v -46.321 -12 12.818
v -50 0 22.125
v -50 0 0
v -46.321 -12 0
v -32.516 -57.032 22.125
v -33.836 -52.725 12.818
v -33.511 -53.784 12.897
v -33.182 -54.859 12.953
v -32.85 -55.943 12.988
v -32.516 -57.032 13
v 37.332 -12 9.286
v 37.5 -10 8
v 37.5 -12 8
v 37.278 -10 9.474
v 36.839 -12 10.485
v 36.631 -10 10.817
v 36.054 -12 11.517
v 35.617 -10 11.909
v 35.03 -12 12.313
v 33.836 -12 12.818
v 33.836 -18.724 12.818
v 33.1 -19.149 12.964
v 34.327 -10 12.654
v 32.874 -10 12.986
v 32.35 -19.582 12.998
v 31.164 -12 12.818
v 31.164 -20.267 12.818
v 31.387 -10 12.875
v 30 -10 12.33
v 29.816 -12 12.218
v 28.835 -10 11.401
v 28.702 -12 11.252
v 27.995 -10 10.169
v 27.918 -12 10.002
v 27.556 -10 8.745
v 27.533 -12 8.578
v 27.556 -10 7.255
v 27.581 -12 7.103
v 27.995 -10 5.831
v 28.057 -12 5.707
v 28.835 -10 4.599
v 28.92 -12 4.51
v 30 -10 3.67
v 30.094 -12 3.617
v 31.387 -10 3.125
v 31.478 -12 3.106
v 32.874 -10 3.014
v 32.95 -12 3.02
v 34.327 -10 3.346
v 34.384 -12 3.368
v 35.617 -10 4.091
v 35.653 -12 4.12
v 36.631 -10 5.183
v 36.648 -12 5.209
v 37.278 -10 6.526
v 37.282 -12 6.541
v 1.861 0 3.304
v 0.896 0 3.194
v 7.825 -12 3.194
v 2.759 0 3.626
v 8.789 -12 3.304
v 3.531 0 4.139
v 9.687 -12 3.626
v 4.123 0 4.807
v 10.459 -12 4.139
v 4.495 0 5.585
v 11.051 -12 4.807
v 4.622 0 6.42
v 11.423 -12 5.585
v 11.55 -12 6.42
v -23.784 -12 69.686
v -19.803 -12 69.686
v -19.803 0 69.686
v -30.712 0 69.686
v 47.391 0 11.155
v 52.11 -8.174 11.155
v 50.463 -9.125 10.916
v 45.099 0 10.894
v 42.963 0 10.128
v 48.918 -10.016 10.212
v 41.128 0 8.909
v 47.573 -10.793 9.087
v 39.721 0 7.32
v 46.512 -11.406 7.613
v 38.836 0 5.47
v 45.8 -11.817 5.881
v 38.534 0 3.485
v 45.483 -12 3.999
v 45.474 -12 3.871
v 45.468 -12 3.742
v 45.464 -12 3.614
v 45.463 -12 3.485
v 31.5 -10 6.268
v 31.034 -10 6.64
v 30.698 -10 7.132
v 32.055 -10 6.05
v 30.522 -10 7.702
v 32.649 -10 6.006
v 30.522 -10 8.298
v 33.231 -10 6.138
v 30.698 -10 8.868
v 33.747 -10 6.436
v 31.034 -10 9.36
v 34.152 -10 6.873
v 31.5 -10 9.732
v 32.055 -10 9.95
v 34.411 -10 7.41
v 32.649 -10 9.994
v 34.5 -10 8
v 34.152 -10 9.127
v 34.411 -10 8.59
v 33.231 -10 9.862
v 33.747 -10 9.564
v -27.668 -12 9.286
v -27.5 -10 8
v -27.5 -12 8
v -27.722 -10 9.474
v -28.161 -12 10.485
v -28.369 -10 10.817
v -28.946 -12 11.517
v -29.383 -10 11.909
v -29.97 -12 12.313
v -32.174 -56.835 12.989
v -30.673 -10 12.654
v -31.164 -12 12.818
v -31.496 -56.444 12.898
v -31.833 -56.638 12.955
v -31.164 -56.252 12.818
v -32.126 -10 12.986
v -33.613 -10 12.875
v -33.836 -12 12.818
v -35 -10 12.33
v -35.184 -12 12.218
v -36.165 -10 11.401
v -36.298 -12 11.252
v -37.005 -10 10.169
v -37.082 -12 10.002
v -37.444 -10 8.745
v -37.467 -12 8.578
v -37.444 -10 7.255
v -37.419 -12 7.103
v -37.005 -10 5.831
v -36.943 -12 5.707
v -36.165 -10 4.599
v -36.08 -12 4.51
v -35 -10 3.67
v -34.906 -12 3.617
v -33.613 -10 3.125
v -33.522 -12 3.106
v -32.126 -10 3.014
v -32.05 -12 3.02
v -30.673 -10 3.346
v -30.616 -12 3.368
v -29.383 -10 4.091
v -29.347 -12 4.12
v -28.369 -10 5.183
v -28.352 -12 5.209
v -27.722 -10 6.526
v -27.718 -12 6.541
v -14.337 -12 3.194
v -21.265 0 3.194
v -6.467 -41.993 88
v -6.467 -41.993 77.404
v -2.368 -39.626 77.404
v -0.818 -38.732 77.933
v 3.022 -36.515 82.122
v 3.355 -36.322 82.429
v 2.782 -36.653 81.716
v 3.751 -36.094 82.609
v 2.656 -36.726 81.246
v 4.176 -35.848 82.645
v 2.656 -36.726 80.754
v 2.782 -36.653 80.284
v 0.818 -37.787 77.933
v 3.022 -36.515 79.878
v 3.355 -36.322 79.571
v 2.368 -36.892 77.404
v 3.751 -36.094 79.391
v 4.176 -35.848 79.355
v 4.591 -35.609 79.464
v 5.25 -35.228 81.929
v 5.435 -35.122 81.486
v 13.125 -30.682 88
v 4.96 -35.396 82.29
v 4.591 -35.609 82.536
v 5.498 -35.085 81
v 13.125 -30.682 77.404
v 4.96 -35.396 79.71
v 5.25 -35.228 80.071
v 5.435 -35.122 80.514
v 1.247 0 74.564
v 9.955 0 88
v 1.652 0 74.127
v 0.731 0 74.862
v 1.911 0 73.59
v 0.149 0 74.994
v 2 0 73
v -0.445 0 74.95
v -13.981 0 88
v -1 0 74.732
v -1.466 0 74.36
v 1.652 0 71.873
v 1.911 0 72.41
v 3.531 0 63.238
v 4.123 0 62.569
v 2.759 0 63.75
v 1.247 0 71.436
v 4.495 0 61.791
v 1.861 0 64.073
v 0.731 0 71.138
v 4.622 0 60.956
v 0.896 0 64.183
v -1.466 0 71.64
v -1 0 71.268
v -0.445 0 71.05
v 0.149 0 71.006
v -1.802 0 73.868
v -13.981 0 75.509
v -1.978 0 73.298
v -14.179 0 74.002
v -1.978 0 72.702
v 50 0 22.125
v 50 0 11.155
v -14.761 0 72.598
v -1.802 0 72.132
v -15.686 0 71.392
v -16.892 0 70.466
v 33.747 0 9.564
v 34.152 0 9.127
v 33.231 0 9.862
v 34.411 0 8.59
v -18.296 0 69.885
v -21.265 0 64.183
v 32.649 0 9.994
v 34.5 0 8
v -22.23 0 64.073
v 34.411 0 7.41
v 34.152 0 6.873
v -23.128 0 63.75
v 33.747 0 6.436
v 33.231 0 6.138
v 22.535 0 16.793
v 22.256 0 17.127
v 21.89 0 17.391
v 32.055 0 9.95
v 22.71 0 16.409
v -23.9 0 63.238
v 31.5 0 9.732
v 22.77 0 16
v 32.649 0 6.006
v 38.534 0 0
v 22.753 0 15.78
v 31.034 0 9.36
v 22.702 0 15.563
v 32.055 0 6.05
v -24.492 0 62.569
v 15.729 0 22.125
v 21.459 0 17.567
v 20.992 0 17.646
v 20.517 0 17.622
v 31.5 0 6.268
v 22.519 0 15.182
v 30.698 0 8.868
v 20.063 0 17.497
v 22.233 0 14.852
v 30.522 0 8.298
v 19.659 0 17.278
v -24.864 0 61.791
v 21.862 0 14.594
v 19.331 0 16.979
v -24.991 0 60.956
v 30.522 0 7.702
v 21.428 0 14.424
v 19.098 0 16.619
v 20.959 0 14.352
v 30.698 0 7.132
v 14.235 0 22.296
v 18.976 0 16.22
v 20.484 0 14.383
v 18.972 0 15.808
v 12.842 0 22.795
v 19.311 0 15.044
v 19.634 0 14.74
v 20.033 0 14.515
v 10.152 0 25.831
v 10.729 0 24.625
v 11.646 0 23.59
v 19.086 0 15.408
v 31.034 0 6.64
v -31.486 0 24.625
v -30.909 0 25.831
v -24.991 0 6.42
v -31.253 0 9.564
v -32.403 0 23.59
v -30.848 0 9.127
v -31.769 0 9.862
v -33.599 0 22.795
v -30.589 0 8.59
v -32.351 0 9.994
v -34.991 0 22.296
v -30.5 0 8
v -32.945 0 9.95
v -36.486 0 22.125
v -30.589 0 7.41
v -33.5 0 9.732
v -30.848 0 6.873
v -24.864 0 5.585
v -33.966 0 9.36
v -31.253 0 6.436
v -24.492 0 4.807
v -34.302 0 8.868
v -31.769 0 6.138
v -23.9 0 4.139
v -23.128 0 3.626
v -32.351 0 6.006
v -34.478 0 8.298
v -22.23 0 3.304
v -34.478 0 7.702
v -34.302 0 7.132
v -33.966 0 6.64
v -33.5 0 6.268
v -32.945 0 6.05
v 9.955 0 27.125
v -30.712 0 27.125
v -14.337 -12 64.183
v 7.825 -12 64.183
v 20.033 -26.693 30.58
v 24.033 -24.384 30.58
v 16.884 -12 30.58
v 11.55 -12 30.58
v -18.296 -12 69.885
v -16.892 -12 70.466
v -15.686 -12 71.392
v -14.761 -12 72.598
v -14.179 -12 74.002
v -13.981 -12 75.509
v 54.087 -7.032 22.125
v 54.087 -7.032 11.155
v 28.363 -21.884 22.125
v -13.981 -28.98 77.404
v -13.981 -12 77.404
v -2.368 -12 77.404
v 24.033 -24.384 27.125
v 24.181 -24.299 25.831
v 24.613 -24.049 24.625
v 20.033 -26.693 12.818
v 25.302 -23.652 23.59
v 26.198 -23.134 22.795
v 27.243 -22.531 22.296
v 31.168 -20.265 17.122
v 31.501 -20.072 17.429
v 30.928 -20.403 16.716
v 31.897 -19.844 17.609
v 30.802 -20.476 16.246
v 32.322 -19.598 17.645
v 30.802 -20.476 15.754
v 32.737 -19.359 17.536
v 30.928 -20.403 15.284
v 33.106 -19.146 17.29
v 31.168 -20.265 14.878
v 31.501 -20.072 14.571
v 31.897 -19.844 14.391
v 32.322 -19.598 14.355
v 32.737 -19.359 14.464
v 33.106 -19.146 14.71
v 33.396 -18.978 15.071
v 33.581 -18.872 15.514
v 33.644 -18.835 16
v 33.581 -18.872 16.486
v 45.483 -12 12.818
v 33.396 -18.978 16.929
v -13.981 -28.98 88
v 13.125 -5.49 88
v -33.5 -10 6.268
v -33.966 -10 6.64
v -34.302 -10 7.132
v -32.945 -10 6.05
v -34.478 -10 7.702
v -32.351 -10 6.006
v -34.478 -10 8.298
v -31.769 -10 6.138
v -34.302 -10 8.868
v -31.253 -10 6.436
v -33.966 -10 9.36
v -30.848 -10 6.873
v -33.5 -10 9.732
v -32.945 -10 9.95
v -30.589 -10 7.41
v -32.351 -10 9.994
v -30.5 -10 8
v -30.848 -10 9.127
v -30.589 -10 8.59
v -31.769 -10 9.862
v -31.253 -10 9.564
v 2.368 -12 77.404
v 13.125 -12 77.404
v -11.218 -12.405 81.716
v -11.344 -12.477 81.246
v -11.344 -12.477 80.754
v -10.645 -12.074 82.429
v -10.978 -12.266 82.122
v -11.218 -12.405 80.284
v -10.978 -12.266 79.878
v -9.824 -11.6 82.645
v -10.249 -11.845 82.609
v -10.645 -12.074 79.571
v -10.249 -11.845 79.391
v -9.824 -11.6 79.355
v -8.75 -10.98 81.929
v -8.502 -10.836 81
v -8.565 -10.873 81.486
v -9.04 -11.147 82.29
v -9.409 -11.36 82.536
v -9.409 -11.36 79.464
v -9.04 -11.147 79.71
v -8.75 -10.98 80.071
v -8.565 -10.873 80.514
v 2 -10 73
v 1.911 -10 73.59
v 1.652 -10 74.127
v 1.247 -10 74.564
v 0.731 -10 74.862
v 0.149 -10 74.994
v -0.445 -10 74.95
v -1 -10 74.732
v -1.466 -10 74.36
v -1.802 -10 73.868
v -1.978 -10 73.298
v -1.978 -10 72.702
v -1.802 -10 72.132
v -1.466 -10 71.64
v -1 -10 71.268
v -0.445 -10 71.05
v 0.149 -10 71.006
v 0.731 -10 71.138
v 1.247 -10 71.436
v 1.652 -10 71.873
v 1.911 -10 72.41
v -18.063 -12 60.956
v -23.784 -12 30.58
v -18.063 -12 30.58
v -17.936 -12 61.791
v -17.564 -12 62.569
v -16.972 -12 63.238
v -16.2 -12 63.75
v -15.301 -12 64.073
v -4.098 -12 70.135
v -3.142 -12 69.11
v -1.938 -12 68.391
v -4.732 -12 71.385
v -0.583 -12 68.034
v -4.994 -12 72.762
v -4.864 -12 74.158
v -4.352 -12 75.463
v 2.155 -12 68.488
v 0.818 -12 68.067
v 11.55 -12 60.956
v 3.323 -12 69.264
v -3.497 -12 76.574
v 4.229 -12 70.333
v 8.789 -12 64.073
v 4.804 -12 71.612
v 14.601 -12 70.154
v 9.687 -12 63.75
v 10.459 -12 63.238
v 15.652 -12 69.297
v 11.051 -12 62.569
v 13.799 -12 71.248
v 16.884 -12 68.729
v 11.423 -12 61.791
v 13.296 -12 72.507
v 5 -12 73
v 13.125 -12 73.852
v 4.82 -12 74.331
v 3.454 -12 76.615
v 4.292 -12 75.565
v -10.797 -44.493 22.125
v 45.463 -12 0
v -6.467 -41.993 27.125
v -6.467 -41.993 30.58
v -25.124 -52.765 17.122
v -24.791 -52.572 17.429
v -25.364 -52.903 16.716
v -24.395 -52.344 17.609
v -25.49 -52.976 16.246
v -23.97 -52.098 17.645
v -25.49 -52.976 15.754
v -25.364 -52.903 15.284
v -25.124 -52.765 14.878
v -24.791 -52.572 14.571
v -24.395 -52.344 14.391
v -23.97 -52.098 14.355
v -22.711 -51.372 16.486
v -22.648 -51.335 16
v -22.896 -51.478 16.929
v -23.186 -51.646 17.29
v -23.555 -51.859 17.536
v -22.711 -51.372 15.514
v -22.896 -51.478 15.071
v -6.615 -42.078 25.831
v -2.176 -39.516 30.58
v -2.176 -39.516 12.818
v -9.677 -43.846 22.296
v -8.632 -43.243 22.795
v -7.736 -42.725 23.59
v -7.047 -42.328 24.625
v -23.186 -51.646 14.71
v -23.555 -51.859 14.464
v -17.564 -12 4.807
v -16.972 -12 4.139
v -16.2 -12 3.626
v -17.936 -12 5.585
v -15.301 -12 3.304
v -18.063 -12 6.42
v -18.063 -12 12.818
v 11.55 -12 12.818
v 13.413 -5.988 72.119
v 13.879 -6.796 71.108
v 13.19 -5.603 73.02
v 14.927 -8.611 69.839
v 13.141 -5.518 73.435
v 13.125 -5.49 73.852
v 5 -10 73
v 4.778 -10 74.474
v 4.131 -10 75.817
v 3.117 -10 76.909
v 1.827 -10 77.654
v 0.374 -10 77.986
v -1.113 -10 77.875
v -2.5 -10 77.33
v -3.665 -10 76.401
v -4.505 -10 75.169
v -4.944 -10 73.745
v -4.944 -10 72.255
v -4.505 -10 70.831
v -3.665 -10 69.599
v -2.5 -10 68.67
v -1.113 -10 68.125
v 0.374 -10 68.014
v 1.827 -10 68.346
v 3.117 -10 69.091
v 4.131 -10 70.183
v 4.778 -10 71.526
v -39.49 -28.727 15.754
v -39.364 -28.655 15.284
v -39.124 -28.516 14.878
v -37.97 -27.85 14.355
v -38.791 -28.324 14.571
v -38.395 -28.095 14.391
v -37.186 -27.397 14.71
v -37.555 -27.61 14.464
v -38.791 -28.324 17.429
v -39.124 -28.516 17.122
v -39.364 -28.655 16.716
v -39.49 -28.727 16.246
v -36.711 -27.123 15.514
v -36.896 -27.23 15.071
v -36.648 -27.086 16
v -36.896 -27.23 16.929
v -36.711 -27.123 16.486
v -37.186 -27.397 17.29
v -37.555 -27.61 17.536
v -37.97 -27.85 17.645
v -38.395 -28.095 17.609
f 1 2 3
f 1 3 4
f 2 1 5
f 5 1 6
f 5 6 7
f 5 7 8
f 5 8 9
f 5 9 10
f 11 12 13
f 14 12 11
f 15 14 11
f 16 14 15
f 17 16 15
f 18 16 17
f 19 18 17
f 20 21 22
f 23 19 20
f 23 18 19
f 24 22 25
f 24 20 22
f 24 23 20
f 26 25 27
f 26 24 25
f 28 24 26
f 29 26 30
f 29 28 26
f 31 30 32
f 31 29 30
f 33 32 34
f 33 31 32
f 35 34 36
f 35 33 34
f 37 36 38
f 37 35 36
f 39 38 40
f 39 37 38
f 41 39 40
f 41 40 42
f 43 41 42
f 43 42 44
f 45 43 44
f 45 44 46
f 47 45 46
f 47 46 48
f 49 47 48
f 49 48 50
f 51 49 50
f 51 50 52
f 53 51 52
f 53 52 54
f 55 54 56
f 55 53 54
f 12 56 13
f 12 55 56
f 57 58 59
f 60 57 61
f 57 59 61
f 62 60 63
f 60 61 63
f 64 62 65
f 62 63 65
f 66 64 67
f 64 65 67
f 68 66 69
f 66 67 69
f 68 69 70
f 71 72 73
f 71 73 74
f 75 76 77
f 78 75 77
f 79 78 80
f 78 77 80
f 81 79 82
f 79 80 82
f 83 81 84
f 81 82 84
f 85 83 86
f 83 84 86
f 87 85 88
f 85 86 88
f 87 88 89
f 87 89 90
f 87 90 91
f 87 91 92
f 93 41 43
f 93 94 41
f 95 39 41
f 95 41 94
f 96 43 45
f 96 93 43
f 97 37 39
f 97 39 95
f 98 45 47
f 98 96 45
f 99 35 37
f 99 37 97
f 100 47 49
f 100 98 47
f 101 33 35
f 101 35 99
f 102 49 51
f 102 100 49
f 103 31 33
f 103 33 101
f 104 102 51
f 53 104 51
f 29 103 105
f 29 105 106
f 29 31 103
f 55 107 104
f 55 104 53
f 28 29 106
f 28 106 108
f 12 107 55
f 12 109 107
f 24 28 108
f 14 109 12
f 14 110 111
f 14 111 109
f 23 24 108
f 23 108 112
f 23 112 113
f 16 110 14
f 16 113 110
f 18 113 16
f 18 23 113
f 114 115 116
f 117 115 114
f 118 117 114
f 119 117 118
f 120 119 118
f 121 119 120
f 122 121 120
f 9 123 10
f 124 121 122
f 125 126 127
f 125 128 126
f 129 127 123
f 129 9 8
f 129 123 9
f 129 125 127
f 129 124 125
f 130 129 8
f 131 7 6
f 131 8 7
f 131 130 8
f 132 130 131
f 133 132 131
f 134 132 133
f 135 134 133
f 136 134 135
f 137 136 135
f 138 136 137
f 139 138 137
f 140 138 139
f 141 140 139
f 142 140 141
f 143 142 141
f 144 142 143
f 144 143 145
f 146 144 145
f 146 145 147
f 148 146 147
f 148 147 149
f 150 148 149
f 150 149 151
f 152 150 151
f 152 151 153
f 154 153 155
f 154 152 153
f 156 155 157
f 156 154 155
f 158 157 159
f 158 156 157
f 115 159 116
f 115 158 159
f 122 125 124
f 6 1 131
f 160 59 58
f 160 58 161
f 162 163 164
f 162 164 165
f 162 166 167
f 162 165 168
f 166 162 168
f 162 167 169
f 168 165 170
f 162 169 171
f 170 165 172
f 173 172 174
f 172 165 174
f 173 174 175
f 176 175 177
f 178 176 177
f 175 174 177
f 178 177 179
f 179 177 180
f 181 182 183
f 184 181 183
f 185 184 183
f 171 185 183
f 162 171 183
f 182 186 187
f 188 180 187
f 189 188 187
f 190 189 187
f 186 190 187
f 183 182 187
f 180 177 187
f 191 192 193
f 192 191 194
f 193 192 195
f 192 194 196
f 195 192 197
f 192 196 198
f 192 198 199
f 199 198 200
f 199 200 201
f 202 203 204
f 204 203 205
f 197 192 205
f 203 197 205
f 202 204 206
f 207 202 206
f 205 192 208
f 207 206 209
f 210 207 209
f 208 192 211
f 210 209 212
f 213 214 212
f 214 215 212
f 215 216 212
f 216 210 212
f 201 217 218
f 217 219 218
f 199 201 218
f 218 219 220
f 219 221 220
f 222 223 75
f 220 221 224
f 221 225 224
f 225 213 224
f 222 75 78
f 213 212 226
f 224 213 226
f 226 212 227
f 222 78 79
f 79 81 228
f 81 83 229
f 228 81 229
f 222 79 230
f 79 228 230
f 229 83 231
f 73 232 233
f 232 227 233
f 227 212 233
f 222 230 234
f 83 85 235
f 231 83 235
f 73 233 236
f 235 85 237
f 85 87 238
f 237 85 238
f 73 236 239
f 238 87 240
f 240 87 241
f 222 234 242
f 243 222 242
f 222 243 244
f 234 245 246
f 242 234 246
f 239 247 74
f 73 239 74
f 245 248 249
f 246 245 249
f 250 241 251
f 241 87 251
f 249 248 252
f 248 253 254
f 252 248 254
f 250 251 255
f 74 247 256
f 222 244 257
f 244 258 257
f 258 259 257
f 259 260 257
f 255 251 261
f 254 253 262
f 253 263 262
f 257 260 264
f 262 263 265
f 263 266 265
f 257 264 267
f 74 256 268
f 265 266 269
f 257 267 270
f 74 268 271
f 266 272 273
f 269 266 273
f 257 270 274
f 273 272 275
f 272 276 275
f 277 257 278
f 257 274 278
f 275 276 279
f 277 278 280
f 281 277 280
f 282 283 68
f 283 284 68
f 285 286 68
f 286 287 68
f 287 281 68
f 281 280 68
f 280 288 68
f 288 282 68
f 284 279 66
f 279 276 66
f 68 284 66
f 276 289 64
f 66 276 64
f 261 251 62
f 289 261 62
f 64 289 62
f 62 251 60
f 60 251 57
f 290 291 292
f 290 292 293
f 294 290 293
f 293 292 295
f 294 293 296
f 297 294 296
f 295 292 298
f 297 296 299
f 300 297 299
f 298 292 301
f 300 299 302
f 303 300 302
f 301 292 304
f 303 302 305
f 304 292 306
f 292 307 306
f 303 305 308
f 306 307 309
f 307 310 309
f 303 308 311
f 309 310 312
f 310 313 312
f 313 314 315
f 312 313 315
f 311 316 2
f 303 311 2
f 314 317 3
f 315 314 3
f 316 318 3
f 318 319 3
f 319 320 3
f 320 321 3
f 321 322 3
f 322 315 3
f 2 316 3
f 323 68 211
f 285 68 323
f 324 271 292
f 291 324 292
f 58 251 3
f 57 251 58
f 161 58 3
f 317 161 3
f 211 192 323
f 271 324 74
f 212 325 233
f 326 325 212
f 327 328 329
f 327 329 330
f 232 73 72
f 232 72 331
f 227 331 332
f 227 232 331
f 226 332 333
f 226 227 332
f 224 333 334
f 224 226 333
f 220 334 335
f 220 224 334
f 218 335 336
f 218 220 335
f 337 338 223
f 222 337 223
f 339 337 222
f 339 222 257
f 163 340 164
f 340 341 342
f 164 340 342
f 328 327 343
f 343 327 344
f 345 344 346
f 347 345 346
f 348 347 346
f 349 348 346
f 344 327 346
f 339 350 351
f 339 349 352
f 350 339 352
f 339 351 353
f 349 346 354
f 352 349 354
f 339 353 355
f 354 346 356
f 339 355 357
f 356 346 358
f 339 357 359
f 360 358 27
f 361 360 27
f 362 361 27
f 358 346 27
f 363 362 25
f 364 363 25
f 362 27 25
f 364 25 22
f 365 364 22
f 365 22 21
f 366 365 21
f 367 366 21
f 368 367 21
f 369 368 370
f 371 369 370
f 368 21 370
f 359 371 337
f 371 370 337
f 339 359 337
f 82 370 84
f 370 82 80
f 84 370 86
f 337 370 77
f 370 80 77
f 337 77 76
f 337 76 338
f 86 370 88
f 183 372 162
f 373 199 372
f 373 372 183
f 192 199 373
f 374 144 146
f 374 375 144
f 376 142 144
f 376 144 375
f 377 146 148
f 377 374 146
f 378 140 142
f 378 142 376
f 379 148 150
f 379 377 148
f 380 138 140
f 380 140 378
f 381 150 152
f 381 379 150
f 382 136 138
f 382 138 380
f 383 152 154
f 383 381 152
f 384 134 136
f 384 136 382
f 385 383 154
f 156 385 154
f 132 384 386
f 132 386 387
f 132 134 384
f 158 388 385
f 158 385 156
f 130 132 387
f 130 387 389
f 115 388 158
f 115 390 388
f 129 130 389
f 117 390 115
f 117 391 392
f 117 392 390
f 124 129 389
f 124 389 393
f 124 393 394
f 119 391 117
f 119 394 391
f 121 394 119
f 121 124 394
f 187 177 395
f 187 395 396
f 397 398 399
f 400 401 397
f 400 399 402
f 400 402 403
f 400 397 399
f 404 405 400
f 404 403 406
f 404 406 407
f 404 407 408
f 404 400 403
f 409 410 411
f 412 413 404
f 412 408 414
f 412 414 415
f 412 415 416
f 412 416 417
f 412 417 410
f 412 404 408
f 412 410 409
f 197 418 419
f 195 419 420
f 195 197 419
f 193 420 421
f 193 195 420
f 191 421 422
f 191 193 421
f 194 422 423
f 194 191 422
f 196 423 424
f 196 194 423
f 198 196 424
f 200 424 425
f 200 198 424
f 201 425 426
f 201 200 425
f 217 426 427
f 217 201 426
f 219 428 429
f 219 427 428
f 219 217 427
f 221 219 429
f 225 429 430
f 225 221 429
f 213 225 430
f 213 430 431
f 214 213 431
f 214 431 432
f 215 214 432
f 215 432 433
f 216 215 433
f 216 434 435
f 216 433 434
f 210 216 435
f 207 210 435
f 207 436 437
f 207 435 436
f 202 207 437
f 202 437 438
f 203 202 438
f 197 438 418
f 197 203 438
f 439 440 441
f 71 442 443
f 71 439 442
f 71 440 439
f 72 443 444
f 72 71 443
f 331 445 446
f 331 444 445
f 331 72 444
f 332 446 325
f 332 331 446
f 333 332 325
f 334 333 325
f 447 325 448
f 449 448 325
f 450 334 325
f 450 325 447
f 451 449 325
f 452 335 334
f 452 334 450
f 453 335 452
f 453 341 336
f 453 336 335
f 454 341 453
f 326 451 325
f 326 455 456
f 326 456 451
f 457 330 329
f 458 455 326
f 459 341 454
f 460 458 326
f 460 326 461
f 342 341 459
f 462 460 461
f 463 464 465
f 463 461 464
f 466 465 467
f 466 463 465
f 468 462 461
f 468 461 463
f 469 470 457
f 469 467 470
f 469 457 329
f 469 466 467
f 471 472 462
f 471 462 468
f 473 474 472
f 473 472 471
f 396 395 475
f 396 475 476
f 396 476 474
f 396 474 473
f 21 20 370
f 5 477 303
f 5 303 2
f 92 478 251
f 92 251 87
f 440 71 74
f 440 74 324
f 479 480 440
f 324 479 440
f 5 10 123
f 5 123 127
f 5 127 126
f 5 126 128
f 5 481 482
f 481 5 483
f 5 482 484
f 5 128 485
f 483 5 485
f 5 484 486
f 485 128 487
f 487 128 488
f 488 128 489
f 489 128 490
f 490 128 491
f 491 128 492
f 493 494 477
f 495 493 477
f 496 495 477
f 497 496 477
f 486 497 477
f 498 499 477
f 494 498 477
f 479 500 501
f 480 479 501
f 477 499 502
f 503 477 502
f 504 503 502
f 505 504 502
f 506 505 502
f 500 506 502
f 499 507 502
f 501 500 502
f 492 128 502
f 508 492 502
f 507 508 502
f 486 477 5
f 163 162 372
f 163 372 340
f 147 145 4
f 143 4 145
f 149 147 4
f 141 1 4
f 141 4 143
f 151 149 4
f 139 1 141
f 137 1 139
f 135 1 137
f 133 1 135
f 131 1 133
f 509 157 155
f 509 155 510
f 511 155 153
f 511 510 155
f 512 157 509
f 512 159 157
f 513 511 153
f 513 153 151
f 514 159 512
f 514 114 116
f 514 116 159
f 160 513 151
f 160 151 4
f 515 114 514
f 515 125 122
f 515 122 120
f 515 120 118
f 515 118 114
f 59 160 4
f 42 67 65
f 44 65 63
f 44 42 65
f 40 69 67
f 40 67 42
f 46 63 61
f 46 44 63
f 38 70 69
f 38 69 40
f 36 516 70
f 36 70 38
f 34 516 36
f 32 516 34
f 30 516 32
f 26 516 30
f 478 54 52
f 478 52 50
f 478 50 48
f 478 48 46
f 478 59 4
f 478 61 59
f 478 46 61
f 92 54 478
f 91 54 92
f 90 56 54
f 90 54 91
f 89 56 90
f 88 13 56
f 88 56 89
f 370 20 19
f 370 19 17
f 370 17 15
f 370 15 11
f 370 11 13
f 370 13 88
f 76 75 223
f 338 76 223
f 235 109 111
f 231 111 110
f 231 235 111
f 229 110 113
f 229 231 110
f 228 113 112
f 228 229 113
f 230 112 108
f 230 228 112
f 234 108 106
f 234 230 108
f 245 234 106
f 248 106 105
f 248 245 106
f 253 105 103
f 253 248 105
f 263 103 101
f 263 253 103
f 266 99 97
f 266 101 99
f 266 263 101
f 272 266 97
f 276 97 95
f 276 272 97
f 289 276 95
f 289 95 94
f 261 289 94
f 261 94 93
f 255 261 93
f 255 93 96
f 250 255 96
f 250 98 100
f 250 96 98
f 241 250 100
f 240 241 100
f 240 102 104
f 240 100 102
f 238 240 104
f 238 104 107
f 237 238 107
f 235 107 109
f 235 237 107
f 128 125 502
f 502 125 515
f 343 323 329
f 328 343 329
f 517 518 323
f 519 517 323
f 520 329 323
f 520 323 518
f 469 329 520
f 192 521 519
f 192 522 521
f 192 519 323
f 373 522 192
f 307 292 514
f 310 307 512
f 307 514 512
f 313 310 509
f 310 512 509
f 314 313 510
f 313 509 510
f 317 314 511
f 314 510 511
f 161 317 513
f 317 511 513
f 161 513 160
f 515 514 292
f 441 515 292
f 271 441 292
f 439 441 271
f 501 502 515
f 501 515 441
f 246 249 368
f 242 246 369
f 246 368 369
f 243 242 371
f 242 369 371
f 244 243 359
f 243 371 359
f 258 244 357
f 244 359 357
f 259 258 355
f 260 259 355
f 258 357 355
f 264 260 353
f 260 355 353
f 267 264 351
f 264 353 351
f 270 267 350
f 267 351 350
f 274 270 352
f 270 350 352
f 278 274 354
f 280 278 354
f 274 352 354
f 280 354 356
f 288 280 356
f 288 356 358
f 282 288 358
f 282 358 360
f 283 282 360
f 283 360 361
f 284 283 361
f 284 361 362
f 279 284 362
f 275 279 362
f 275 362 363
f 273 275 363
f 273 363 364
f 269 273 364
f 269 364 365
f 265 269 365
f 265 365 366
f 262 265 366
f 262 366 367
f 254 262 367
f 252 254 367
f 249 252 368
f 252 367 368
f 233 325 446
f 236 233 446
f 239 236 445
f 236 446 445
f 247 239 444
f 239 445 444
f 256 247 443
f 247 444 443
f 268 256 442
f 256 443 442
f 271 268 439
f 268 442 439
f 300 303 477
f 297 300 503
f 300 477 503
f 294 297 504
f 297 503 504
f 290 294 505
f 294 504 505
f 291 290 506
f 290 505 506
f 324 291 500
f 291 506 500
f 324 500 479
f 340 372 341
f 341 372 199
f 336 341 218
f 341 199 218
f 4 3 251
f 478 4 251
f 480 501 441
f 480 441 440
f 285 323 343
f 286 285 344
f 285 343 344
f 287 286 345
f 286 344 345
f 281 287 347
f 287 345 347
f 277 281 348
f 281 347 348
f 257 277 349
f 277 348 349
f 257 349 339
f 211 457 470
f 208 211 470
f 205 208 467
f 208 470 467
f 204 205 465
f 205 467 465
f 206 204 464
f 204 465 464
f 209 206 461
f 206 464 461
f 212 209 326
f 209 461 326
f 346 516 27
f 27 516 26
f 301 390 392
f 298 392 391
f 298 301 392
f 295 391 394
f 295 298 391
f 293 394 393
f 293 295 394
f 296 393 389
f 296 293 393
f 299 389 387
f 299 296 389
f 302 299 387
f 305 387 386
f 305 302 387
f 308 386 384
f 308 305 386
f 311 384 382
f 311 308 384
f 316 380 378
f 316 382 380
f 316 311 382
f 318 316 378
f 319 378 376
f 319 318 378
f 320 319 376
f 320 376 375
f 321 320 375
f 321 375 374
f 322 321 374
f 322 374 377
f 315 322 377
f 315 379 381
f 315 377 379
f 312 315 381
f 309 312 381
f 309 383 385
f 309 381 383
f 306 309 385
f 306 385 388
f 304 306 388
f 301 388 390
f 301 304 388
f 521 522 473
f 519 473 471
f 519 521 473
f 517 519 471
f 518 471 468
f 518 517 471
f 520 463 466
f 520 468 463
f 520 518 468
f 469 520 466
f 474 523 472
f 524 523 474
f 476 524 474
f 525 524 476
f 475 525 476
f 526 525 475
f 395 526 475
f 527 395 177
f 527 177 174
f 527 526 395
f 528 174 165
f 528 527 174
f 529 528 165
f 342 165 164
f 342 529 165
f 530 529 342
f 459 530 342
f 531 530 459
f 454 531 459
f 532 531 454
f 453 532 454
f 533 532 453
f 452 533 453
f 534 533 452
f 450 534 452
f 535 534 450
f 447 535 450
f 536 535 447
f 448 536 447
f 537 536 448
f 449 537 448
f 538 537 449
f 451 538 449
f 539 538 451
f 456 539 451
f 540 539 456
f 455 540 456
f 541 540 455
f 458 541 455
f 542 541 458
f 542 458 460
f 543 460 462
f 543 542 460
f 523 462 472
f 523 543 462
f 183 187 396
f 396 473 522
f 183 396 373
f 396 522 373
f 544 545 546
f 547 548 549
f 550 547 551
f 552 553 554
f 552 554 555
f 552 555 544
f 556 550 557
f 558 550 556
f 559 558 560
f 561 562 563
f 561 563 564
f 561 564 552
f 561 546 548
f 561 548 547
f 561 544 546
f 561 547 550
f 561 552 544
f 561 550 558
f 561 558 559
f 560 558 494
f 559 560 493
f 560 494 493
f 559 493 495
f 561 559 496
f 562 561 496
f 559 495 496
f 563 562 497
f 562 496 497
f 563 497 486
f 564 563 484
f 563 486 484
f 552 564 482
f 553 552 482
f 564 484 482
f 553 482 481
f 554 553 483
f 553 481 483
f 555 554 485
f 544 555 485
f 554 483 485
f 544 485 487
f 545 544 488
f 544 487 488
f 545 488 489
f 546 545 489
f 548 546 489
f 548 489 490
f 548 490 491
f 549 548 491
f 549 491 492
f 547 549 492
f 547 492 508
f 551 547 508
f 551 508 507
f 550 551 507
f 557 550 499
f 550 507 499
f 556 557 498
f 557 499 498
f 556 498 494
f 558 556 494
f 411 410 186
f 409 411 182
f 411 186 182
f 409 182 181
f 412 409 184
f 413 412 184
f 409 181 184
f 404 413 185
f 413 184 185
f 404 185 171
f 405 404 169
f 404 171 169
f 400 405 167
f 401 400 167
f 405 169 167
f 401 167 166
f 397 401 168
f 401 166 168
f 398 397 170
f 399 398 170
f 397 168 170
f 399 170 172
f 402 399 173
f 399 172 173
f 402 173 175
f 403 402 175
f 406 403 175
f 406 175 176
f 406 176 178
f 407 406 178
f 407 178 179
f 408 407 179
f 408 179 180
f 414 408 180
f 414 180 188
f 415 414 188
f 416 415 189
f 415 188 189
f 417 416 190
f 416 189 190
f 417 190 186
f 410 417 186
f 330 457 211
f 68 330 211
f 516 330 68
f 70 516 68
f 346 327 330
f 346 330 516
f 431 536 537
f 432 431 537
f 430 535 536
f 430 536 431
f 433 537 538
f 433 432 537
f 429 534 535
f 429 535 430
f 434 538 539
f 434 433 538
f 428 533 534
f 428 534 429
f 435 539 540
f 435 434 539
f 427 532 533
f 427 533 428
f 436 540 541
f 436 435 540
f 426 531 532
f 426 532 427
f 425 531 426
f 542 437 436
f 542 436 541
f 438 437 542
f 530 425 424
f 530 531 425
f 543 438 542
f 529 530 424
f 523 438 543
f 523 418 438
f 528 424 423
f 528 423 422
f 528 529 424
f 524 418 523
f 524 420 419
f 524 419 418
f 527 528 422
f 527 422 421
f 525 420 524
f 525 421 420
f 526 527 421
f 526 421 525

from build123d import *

# Parameters (mm, degrees)
PAD_DEPTH         = 88
SKETCH001_R       = 2
POCKET_DEPTH      = 0.001
POCKET_DEPTH_BACK = 57.033261
SKETCH002_R       = 5
POCKET001_DEPTH   = 47.033261
SKETCH003_R       = 1.65
POCKET002_DEPTH   = 28
POCKET003_DEPTH   = 58.134580172
POCKET004_DEPTH   = 45.033261


with BuildPart() as part:
    # Sketch → Pad (new body)
    with BuildSketch(Plane.XY):
        Polygon((0, 0), (-50, 0), (-32.5156133784, -57.032261), (54.086927, -7.032261), (50, 0), align=None)
    extrude(amount=PAD_DEPTH)

    # Sketch001 → Pocket (cut, two sides)
    with BuildSketch(Plane.XZ) as pocket_sk:
        with Locations((-32.5, 8)):
            Circle(SKETCH001_R)
        with Locations((32.5, 8)):
            Circle(SKETCH001_R)
        with Locations((0, 73)):
            Circle(SKETCH001_R)
        with BuildLine():
            ThreePointArc((-31.448877, 94.382629), (-35.5661724156, 92.6771893986), (-37.2716120171, 88.5598939829))
            Line((-37.2716120171, 75.5089300171), (-37.2716120171, 88.5598939829))
            ThreePointArc((-37.2716120171, 75.5089300171), (-35.5661724156, 71.3916346014), (-31.448877, 69.686195))
            Line((-19.8034130171, 69.686195), (-31.448877, 69.686195))
            ThreePointArc((-19.8034130171, 69.686195), (-15.6861176014, 71.3916346014), (-13.980678, 75.5089300171))
            Line((-13.980678, 88.5598939829), (-13.980678, 75.5089300171))
            ThreePointArc((-13.980678, 88.5598939829), (-15.6861176014, 92.6771893986), (-19.8034130171, 94.382629))
            Line((-31.448877, 94.382629), (-19.8034130171, 94.382629))
        make_face()
        with BuildLine():
            ThreePointArc((18.49613, 98.398308), (14.6982792772, 96.8251867228), (13.125158, 93.027336))
            Line((13.125158, 73.852471), (13.125158, 93.027336))
            ThreePointArc((13.125158, 73.852471), (14.6982792772, 70.0546202772), (18.49613, 68.481499))
            Line((29.238075, 68.481499), (18.49613, 68.481499))
            ThreePointArc((29.238075, 68.481499), (33.0359257228, 70.0546202772), (34.609047, 73.852471))
            Line((34.609047, 93.027336), (34.609047, 73.852471))
            ThreePointArc((34.609047, 93.027336), (33.0359257228, 96.8251867228), (29.238075, 98.398308))
            Line((18.49613, 98.398308), (29.238075, 98.398308))
        make_face()
    extrude(amount=-POCKET_DEPTH, mode=Mode.SUBTRACT)
    extrude(pocket_sk.sketch, amount=POCKET_DEPTH_BACK, mode=Mode.SUBTRACT)

    # Sketch002 → Pocket001 (cut, through all)
    with BuildSketch(Plane.XZ.offset(10)):
        with Locations((-32.5, 8)):
            Circle(SKETCH002_R)
        with Locations((32.5, 8)):
            Circle(SKETCH002_R)
        with Locations((0, 73)):
            Circle(SKETCH002_R)
    extrude(amount=POCKET001_DEPTH, mode=Mode.SUBTRACT)

    # Sketch003 (on Face2 of Pocket001) → Pocket002 (cut)
    with BuildSketch(Plane(origin=(16.566790086, -28.6945221473, 0), x_dir=(0.8660254038, 0.5, 0), z_dir=(0.5, -0.8660254038, 0))):
        with Locations((18.0690987246, 16)):
            Circle(SKETCH003_R)
        with Locations((-46.9309012754, 16)):
            Circle(SKETCH003_R)
        with Locations((-14.4309012754, 81)):
            Circle(SKETCH003_R)
    extrude(amount=-POCKET002_DEPTH, mode=Mode.SUBTRACT)

    # Sketch004 (on Face2 of Pocket002) → Pocket003 (cut, through all)
    with BuildSketch(Plane(origin=(16.566790086, -28.6945221473, 0), x_dir=(0.8660254038, 0.5, 0), z_dir=(0.5, -0.8660254038, 0))):
        with BuildLine():
            ThreePointArc((13.6215579788, 99.375281956), (10.0860240728, 97.9108158619), (8.6215579788, 94.375281956))
            Line((8.6215579788, 27.1252926568), (8.6215579788, 94.375281956))
            ThreePointArc((8.6215579788, 27.1252926568), (10.0860240728, 23.5897587509), (13.6215579788, 22.1252926568))
            Line((44.7393771197, 22.1252926568), (13.6215579788, 22.1252926568))
            ThreePointArc((44.7393771197, 22.1252926568), (48.2749110256, 23.5897587509), (49.7393771197, 27.1252926568))
            Line((49.7393771197, 94.375281956), (49.7393771197, 27.1252926568))
            ThreePointArc((49.7393771197, 94.375281956), (48.2749110256, 97.9108158619), (44.7393771197, 99.375281956))
            Line((13.6215579788, 99.375281956), (44.7393771197, 99.375281956))
        make_face()
        with BuildLine():
            ThreePointArc((-82.3406850147, 105.6353147348), (-85.8762189206, 104.1708486408), (-87.3406850147, 100.6353147348))
            Line((-87.3406850147, 27.1252928143), (-87.3406850147, 100.6353147348))
            ThreePointArc((-87.3406850147, 27.1252928143), (-85.8762189206, 23.5897589083), (-82.3406850147, 22.1252928143))
            Line((-31.5974694977, 22.1252928143), (-82.3406850147, 22.1252928143))
            ThreePointArc((-31.5974694977, 22.1252928143), (-28.0619355917, 23.5897589083), (-26.5974694977, 27.1252928143))
            Line((-26.5974694977, 100.6353147348), (-26.5974694977, 27.1252928143))
            ThreePointArc((-26.5974694977, 100.6353147348), (-28.0619355917, 104.1708486408), (-31.5974694977, 105.6353147348))
            Line((-82.3406850147, 105.6353147348), (-31.5974694977, 105.6353147348))
        make_face()
        with BuildLine():
            ThreePointArc((-18.4163422765, 64.182594), (-20.6977909978, 63.2375869978), (-21.642798, 60.9561382765))
            Line((-21.642798, 6.4200485882), (-21.642798, 60.9561382765))
            ThreePointArc((-21.642798, 6.4200485882), (-20.6977909978, 4.1385998669), (-18.4163422765, 3.1935928646))
            Line((0.7763344118, 3.1935928646), (-18.4163422765, 3.1935928646))
            ThreePointArc((0.7763344118, 3.1935928646), (3.0577831331, 4.1385998669), (4.0027901354, 6.4200485882))
            Line((4.0027901354, 60.9561382765), (4.0027901354, 6.4200485882))
            ThreePointArc((4.0027901354, 60.9561382765), (3.0577831331, 63.2375869978), (0.7763344118, 64.182594))
            Line((-18.4163422765, 64.182594), (0.7763344118, 64.182594))
        make_face()
        with BuildLine():
            ThreePointArc((33.371799, -13.9859969869), (35.6183005855, -19.4095315824), (41.041835181, -21.6560331679))
            Line((57.2190858452, -21.6560331679), (41.041835181, -21.6560331679))
            ThreePointArc((57.2190858452, -21.6560331679), (62.6426204407, -19.4095315824), (64.8891220262, -13.9859969869))
            Line((64.8891220262, 3.485097), (64.8891220262, -13.9859969869))
            ThreePointArc((64.8891220262, 3.485097), (62.6426204407, 8.9086315955), (57.2190858452, 11.155133181))
            Line((41.041835181, 11.155133181), (57.2190858452, 11.155133181))
            ThreePointArc((41.041835181, 11.155133181), (35.6183005855, 8.9086315955), (33.371799, 3.485097))
            Line((33.371799, -13.9859969869), (33.371799, 3.485097))
        make_face()
    extrude(amount=-POCKET003_DEPTH, mode=Mode.SUBTRACT)

    # Sketch005 → Pocket004 (cut, through all)
    with BuildSketch(Plane.XZ.offset(12)):
        with BuildLine():
            ThreePointArc((-72.562921396, 12.818138604), (-85.0985797487, 7.625698901), (-90.2910194516, -4.9099594516))
            Line((-90.2910194516, -39.9313305758), (-90.2910194516, -4.9099594516))
            ThreePointArc((-90.2910194516, -39.9313305758), (-85.0985797487, -52.4669889284), (-72.562921396, -57.6594286314))
            Line((82.146623396, -57.6594286314), (-72.562921396, -57.6594286314))
            ThreePointArc((82.146623396, -57.6594286314), (94.6822817487, -52.4669889284), (99.8747214516, -39.9313305758))
            Line((99.8747214516, -4.9099594516), (99.8747214516, -39.9313305758))
            ThreePointArc((99.8747214516, -4.9099594516), (94.6822817487, 7.625698901), (82.146623396, 12.818138604))
            Line((-72.562921396, 12.818138604), (82.146623396, 12.818138604))
        make_face()
        with BuildLine():
            ThreePointArc((-53.674213, 77.4039000645), (-62.7743204587, 73.6345121361), (-66.5437083871, 64.5344046774))
            Line((-66.5437083871, 43.4490521935), (-66.5437083871, 64.5344046774))
            ThreePointArc((-66.5437083871, 43.4490521935), (-62.7743204587, 34.3489447349), (-53.674213, 30.5795568065))
            Line((56.105189, 30.5795568065), (-53.674213, 30.5795568065))
            ThreePointArc((56.105189, 30.5795568065), (65.2052964587, 34.3489447349), (68.9746843871, 43.4490521935))
            Line((68.9746843871, 64.5344046774), (68.9746843871, 43.4490521935))
            ThreePointArc((68.9746843871, 64.5344046774), (65.2052964587, 73.6345121361), (56.105189, 77.4039000645))
            Line((-53.674213, 77.4039000645), (56.105189, 77.4039000645))
        make_face()
    extrude(amount=POCKET004_DEPTH, mode=Mode.SUBTRACT)


solid = part.part
